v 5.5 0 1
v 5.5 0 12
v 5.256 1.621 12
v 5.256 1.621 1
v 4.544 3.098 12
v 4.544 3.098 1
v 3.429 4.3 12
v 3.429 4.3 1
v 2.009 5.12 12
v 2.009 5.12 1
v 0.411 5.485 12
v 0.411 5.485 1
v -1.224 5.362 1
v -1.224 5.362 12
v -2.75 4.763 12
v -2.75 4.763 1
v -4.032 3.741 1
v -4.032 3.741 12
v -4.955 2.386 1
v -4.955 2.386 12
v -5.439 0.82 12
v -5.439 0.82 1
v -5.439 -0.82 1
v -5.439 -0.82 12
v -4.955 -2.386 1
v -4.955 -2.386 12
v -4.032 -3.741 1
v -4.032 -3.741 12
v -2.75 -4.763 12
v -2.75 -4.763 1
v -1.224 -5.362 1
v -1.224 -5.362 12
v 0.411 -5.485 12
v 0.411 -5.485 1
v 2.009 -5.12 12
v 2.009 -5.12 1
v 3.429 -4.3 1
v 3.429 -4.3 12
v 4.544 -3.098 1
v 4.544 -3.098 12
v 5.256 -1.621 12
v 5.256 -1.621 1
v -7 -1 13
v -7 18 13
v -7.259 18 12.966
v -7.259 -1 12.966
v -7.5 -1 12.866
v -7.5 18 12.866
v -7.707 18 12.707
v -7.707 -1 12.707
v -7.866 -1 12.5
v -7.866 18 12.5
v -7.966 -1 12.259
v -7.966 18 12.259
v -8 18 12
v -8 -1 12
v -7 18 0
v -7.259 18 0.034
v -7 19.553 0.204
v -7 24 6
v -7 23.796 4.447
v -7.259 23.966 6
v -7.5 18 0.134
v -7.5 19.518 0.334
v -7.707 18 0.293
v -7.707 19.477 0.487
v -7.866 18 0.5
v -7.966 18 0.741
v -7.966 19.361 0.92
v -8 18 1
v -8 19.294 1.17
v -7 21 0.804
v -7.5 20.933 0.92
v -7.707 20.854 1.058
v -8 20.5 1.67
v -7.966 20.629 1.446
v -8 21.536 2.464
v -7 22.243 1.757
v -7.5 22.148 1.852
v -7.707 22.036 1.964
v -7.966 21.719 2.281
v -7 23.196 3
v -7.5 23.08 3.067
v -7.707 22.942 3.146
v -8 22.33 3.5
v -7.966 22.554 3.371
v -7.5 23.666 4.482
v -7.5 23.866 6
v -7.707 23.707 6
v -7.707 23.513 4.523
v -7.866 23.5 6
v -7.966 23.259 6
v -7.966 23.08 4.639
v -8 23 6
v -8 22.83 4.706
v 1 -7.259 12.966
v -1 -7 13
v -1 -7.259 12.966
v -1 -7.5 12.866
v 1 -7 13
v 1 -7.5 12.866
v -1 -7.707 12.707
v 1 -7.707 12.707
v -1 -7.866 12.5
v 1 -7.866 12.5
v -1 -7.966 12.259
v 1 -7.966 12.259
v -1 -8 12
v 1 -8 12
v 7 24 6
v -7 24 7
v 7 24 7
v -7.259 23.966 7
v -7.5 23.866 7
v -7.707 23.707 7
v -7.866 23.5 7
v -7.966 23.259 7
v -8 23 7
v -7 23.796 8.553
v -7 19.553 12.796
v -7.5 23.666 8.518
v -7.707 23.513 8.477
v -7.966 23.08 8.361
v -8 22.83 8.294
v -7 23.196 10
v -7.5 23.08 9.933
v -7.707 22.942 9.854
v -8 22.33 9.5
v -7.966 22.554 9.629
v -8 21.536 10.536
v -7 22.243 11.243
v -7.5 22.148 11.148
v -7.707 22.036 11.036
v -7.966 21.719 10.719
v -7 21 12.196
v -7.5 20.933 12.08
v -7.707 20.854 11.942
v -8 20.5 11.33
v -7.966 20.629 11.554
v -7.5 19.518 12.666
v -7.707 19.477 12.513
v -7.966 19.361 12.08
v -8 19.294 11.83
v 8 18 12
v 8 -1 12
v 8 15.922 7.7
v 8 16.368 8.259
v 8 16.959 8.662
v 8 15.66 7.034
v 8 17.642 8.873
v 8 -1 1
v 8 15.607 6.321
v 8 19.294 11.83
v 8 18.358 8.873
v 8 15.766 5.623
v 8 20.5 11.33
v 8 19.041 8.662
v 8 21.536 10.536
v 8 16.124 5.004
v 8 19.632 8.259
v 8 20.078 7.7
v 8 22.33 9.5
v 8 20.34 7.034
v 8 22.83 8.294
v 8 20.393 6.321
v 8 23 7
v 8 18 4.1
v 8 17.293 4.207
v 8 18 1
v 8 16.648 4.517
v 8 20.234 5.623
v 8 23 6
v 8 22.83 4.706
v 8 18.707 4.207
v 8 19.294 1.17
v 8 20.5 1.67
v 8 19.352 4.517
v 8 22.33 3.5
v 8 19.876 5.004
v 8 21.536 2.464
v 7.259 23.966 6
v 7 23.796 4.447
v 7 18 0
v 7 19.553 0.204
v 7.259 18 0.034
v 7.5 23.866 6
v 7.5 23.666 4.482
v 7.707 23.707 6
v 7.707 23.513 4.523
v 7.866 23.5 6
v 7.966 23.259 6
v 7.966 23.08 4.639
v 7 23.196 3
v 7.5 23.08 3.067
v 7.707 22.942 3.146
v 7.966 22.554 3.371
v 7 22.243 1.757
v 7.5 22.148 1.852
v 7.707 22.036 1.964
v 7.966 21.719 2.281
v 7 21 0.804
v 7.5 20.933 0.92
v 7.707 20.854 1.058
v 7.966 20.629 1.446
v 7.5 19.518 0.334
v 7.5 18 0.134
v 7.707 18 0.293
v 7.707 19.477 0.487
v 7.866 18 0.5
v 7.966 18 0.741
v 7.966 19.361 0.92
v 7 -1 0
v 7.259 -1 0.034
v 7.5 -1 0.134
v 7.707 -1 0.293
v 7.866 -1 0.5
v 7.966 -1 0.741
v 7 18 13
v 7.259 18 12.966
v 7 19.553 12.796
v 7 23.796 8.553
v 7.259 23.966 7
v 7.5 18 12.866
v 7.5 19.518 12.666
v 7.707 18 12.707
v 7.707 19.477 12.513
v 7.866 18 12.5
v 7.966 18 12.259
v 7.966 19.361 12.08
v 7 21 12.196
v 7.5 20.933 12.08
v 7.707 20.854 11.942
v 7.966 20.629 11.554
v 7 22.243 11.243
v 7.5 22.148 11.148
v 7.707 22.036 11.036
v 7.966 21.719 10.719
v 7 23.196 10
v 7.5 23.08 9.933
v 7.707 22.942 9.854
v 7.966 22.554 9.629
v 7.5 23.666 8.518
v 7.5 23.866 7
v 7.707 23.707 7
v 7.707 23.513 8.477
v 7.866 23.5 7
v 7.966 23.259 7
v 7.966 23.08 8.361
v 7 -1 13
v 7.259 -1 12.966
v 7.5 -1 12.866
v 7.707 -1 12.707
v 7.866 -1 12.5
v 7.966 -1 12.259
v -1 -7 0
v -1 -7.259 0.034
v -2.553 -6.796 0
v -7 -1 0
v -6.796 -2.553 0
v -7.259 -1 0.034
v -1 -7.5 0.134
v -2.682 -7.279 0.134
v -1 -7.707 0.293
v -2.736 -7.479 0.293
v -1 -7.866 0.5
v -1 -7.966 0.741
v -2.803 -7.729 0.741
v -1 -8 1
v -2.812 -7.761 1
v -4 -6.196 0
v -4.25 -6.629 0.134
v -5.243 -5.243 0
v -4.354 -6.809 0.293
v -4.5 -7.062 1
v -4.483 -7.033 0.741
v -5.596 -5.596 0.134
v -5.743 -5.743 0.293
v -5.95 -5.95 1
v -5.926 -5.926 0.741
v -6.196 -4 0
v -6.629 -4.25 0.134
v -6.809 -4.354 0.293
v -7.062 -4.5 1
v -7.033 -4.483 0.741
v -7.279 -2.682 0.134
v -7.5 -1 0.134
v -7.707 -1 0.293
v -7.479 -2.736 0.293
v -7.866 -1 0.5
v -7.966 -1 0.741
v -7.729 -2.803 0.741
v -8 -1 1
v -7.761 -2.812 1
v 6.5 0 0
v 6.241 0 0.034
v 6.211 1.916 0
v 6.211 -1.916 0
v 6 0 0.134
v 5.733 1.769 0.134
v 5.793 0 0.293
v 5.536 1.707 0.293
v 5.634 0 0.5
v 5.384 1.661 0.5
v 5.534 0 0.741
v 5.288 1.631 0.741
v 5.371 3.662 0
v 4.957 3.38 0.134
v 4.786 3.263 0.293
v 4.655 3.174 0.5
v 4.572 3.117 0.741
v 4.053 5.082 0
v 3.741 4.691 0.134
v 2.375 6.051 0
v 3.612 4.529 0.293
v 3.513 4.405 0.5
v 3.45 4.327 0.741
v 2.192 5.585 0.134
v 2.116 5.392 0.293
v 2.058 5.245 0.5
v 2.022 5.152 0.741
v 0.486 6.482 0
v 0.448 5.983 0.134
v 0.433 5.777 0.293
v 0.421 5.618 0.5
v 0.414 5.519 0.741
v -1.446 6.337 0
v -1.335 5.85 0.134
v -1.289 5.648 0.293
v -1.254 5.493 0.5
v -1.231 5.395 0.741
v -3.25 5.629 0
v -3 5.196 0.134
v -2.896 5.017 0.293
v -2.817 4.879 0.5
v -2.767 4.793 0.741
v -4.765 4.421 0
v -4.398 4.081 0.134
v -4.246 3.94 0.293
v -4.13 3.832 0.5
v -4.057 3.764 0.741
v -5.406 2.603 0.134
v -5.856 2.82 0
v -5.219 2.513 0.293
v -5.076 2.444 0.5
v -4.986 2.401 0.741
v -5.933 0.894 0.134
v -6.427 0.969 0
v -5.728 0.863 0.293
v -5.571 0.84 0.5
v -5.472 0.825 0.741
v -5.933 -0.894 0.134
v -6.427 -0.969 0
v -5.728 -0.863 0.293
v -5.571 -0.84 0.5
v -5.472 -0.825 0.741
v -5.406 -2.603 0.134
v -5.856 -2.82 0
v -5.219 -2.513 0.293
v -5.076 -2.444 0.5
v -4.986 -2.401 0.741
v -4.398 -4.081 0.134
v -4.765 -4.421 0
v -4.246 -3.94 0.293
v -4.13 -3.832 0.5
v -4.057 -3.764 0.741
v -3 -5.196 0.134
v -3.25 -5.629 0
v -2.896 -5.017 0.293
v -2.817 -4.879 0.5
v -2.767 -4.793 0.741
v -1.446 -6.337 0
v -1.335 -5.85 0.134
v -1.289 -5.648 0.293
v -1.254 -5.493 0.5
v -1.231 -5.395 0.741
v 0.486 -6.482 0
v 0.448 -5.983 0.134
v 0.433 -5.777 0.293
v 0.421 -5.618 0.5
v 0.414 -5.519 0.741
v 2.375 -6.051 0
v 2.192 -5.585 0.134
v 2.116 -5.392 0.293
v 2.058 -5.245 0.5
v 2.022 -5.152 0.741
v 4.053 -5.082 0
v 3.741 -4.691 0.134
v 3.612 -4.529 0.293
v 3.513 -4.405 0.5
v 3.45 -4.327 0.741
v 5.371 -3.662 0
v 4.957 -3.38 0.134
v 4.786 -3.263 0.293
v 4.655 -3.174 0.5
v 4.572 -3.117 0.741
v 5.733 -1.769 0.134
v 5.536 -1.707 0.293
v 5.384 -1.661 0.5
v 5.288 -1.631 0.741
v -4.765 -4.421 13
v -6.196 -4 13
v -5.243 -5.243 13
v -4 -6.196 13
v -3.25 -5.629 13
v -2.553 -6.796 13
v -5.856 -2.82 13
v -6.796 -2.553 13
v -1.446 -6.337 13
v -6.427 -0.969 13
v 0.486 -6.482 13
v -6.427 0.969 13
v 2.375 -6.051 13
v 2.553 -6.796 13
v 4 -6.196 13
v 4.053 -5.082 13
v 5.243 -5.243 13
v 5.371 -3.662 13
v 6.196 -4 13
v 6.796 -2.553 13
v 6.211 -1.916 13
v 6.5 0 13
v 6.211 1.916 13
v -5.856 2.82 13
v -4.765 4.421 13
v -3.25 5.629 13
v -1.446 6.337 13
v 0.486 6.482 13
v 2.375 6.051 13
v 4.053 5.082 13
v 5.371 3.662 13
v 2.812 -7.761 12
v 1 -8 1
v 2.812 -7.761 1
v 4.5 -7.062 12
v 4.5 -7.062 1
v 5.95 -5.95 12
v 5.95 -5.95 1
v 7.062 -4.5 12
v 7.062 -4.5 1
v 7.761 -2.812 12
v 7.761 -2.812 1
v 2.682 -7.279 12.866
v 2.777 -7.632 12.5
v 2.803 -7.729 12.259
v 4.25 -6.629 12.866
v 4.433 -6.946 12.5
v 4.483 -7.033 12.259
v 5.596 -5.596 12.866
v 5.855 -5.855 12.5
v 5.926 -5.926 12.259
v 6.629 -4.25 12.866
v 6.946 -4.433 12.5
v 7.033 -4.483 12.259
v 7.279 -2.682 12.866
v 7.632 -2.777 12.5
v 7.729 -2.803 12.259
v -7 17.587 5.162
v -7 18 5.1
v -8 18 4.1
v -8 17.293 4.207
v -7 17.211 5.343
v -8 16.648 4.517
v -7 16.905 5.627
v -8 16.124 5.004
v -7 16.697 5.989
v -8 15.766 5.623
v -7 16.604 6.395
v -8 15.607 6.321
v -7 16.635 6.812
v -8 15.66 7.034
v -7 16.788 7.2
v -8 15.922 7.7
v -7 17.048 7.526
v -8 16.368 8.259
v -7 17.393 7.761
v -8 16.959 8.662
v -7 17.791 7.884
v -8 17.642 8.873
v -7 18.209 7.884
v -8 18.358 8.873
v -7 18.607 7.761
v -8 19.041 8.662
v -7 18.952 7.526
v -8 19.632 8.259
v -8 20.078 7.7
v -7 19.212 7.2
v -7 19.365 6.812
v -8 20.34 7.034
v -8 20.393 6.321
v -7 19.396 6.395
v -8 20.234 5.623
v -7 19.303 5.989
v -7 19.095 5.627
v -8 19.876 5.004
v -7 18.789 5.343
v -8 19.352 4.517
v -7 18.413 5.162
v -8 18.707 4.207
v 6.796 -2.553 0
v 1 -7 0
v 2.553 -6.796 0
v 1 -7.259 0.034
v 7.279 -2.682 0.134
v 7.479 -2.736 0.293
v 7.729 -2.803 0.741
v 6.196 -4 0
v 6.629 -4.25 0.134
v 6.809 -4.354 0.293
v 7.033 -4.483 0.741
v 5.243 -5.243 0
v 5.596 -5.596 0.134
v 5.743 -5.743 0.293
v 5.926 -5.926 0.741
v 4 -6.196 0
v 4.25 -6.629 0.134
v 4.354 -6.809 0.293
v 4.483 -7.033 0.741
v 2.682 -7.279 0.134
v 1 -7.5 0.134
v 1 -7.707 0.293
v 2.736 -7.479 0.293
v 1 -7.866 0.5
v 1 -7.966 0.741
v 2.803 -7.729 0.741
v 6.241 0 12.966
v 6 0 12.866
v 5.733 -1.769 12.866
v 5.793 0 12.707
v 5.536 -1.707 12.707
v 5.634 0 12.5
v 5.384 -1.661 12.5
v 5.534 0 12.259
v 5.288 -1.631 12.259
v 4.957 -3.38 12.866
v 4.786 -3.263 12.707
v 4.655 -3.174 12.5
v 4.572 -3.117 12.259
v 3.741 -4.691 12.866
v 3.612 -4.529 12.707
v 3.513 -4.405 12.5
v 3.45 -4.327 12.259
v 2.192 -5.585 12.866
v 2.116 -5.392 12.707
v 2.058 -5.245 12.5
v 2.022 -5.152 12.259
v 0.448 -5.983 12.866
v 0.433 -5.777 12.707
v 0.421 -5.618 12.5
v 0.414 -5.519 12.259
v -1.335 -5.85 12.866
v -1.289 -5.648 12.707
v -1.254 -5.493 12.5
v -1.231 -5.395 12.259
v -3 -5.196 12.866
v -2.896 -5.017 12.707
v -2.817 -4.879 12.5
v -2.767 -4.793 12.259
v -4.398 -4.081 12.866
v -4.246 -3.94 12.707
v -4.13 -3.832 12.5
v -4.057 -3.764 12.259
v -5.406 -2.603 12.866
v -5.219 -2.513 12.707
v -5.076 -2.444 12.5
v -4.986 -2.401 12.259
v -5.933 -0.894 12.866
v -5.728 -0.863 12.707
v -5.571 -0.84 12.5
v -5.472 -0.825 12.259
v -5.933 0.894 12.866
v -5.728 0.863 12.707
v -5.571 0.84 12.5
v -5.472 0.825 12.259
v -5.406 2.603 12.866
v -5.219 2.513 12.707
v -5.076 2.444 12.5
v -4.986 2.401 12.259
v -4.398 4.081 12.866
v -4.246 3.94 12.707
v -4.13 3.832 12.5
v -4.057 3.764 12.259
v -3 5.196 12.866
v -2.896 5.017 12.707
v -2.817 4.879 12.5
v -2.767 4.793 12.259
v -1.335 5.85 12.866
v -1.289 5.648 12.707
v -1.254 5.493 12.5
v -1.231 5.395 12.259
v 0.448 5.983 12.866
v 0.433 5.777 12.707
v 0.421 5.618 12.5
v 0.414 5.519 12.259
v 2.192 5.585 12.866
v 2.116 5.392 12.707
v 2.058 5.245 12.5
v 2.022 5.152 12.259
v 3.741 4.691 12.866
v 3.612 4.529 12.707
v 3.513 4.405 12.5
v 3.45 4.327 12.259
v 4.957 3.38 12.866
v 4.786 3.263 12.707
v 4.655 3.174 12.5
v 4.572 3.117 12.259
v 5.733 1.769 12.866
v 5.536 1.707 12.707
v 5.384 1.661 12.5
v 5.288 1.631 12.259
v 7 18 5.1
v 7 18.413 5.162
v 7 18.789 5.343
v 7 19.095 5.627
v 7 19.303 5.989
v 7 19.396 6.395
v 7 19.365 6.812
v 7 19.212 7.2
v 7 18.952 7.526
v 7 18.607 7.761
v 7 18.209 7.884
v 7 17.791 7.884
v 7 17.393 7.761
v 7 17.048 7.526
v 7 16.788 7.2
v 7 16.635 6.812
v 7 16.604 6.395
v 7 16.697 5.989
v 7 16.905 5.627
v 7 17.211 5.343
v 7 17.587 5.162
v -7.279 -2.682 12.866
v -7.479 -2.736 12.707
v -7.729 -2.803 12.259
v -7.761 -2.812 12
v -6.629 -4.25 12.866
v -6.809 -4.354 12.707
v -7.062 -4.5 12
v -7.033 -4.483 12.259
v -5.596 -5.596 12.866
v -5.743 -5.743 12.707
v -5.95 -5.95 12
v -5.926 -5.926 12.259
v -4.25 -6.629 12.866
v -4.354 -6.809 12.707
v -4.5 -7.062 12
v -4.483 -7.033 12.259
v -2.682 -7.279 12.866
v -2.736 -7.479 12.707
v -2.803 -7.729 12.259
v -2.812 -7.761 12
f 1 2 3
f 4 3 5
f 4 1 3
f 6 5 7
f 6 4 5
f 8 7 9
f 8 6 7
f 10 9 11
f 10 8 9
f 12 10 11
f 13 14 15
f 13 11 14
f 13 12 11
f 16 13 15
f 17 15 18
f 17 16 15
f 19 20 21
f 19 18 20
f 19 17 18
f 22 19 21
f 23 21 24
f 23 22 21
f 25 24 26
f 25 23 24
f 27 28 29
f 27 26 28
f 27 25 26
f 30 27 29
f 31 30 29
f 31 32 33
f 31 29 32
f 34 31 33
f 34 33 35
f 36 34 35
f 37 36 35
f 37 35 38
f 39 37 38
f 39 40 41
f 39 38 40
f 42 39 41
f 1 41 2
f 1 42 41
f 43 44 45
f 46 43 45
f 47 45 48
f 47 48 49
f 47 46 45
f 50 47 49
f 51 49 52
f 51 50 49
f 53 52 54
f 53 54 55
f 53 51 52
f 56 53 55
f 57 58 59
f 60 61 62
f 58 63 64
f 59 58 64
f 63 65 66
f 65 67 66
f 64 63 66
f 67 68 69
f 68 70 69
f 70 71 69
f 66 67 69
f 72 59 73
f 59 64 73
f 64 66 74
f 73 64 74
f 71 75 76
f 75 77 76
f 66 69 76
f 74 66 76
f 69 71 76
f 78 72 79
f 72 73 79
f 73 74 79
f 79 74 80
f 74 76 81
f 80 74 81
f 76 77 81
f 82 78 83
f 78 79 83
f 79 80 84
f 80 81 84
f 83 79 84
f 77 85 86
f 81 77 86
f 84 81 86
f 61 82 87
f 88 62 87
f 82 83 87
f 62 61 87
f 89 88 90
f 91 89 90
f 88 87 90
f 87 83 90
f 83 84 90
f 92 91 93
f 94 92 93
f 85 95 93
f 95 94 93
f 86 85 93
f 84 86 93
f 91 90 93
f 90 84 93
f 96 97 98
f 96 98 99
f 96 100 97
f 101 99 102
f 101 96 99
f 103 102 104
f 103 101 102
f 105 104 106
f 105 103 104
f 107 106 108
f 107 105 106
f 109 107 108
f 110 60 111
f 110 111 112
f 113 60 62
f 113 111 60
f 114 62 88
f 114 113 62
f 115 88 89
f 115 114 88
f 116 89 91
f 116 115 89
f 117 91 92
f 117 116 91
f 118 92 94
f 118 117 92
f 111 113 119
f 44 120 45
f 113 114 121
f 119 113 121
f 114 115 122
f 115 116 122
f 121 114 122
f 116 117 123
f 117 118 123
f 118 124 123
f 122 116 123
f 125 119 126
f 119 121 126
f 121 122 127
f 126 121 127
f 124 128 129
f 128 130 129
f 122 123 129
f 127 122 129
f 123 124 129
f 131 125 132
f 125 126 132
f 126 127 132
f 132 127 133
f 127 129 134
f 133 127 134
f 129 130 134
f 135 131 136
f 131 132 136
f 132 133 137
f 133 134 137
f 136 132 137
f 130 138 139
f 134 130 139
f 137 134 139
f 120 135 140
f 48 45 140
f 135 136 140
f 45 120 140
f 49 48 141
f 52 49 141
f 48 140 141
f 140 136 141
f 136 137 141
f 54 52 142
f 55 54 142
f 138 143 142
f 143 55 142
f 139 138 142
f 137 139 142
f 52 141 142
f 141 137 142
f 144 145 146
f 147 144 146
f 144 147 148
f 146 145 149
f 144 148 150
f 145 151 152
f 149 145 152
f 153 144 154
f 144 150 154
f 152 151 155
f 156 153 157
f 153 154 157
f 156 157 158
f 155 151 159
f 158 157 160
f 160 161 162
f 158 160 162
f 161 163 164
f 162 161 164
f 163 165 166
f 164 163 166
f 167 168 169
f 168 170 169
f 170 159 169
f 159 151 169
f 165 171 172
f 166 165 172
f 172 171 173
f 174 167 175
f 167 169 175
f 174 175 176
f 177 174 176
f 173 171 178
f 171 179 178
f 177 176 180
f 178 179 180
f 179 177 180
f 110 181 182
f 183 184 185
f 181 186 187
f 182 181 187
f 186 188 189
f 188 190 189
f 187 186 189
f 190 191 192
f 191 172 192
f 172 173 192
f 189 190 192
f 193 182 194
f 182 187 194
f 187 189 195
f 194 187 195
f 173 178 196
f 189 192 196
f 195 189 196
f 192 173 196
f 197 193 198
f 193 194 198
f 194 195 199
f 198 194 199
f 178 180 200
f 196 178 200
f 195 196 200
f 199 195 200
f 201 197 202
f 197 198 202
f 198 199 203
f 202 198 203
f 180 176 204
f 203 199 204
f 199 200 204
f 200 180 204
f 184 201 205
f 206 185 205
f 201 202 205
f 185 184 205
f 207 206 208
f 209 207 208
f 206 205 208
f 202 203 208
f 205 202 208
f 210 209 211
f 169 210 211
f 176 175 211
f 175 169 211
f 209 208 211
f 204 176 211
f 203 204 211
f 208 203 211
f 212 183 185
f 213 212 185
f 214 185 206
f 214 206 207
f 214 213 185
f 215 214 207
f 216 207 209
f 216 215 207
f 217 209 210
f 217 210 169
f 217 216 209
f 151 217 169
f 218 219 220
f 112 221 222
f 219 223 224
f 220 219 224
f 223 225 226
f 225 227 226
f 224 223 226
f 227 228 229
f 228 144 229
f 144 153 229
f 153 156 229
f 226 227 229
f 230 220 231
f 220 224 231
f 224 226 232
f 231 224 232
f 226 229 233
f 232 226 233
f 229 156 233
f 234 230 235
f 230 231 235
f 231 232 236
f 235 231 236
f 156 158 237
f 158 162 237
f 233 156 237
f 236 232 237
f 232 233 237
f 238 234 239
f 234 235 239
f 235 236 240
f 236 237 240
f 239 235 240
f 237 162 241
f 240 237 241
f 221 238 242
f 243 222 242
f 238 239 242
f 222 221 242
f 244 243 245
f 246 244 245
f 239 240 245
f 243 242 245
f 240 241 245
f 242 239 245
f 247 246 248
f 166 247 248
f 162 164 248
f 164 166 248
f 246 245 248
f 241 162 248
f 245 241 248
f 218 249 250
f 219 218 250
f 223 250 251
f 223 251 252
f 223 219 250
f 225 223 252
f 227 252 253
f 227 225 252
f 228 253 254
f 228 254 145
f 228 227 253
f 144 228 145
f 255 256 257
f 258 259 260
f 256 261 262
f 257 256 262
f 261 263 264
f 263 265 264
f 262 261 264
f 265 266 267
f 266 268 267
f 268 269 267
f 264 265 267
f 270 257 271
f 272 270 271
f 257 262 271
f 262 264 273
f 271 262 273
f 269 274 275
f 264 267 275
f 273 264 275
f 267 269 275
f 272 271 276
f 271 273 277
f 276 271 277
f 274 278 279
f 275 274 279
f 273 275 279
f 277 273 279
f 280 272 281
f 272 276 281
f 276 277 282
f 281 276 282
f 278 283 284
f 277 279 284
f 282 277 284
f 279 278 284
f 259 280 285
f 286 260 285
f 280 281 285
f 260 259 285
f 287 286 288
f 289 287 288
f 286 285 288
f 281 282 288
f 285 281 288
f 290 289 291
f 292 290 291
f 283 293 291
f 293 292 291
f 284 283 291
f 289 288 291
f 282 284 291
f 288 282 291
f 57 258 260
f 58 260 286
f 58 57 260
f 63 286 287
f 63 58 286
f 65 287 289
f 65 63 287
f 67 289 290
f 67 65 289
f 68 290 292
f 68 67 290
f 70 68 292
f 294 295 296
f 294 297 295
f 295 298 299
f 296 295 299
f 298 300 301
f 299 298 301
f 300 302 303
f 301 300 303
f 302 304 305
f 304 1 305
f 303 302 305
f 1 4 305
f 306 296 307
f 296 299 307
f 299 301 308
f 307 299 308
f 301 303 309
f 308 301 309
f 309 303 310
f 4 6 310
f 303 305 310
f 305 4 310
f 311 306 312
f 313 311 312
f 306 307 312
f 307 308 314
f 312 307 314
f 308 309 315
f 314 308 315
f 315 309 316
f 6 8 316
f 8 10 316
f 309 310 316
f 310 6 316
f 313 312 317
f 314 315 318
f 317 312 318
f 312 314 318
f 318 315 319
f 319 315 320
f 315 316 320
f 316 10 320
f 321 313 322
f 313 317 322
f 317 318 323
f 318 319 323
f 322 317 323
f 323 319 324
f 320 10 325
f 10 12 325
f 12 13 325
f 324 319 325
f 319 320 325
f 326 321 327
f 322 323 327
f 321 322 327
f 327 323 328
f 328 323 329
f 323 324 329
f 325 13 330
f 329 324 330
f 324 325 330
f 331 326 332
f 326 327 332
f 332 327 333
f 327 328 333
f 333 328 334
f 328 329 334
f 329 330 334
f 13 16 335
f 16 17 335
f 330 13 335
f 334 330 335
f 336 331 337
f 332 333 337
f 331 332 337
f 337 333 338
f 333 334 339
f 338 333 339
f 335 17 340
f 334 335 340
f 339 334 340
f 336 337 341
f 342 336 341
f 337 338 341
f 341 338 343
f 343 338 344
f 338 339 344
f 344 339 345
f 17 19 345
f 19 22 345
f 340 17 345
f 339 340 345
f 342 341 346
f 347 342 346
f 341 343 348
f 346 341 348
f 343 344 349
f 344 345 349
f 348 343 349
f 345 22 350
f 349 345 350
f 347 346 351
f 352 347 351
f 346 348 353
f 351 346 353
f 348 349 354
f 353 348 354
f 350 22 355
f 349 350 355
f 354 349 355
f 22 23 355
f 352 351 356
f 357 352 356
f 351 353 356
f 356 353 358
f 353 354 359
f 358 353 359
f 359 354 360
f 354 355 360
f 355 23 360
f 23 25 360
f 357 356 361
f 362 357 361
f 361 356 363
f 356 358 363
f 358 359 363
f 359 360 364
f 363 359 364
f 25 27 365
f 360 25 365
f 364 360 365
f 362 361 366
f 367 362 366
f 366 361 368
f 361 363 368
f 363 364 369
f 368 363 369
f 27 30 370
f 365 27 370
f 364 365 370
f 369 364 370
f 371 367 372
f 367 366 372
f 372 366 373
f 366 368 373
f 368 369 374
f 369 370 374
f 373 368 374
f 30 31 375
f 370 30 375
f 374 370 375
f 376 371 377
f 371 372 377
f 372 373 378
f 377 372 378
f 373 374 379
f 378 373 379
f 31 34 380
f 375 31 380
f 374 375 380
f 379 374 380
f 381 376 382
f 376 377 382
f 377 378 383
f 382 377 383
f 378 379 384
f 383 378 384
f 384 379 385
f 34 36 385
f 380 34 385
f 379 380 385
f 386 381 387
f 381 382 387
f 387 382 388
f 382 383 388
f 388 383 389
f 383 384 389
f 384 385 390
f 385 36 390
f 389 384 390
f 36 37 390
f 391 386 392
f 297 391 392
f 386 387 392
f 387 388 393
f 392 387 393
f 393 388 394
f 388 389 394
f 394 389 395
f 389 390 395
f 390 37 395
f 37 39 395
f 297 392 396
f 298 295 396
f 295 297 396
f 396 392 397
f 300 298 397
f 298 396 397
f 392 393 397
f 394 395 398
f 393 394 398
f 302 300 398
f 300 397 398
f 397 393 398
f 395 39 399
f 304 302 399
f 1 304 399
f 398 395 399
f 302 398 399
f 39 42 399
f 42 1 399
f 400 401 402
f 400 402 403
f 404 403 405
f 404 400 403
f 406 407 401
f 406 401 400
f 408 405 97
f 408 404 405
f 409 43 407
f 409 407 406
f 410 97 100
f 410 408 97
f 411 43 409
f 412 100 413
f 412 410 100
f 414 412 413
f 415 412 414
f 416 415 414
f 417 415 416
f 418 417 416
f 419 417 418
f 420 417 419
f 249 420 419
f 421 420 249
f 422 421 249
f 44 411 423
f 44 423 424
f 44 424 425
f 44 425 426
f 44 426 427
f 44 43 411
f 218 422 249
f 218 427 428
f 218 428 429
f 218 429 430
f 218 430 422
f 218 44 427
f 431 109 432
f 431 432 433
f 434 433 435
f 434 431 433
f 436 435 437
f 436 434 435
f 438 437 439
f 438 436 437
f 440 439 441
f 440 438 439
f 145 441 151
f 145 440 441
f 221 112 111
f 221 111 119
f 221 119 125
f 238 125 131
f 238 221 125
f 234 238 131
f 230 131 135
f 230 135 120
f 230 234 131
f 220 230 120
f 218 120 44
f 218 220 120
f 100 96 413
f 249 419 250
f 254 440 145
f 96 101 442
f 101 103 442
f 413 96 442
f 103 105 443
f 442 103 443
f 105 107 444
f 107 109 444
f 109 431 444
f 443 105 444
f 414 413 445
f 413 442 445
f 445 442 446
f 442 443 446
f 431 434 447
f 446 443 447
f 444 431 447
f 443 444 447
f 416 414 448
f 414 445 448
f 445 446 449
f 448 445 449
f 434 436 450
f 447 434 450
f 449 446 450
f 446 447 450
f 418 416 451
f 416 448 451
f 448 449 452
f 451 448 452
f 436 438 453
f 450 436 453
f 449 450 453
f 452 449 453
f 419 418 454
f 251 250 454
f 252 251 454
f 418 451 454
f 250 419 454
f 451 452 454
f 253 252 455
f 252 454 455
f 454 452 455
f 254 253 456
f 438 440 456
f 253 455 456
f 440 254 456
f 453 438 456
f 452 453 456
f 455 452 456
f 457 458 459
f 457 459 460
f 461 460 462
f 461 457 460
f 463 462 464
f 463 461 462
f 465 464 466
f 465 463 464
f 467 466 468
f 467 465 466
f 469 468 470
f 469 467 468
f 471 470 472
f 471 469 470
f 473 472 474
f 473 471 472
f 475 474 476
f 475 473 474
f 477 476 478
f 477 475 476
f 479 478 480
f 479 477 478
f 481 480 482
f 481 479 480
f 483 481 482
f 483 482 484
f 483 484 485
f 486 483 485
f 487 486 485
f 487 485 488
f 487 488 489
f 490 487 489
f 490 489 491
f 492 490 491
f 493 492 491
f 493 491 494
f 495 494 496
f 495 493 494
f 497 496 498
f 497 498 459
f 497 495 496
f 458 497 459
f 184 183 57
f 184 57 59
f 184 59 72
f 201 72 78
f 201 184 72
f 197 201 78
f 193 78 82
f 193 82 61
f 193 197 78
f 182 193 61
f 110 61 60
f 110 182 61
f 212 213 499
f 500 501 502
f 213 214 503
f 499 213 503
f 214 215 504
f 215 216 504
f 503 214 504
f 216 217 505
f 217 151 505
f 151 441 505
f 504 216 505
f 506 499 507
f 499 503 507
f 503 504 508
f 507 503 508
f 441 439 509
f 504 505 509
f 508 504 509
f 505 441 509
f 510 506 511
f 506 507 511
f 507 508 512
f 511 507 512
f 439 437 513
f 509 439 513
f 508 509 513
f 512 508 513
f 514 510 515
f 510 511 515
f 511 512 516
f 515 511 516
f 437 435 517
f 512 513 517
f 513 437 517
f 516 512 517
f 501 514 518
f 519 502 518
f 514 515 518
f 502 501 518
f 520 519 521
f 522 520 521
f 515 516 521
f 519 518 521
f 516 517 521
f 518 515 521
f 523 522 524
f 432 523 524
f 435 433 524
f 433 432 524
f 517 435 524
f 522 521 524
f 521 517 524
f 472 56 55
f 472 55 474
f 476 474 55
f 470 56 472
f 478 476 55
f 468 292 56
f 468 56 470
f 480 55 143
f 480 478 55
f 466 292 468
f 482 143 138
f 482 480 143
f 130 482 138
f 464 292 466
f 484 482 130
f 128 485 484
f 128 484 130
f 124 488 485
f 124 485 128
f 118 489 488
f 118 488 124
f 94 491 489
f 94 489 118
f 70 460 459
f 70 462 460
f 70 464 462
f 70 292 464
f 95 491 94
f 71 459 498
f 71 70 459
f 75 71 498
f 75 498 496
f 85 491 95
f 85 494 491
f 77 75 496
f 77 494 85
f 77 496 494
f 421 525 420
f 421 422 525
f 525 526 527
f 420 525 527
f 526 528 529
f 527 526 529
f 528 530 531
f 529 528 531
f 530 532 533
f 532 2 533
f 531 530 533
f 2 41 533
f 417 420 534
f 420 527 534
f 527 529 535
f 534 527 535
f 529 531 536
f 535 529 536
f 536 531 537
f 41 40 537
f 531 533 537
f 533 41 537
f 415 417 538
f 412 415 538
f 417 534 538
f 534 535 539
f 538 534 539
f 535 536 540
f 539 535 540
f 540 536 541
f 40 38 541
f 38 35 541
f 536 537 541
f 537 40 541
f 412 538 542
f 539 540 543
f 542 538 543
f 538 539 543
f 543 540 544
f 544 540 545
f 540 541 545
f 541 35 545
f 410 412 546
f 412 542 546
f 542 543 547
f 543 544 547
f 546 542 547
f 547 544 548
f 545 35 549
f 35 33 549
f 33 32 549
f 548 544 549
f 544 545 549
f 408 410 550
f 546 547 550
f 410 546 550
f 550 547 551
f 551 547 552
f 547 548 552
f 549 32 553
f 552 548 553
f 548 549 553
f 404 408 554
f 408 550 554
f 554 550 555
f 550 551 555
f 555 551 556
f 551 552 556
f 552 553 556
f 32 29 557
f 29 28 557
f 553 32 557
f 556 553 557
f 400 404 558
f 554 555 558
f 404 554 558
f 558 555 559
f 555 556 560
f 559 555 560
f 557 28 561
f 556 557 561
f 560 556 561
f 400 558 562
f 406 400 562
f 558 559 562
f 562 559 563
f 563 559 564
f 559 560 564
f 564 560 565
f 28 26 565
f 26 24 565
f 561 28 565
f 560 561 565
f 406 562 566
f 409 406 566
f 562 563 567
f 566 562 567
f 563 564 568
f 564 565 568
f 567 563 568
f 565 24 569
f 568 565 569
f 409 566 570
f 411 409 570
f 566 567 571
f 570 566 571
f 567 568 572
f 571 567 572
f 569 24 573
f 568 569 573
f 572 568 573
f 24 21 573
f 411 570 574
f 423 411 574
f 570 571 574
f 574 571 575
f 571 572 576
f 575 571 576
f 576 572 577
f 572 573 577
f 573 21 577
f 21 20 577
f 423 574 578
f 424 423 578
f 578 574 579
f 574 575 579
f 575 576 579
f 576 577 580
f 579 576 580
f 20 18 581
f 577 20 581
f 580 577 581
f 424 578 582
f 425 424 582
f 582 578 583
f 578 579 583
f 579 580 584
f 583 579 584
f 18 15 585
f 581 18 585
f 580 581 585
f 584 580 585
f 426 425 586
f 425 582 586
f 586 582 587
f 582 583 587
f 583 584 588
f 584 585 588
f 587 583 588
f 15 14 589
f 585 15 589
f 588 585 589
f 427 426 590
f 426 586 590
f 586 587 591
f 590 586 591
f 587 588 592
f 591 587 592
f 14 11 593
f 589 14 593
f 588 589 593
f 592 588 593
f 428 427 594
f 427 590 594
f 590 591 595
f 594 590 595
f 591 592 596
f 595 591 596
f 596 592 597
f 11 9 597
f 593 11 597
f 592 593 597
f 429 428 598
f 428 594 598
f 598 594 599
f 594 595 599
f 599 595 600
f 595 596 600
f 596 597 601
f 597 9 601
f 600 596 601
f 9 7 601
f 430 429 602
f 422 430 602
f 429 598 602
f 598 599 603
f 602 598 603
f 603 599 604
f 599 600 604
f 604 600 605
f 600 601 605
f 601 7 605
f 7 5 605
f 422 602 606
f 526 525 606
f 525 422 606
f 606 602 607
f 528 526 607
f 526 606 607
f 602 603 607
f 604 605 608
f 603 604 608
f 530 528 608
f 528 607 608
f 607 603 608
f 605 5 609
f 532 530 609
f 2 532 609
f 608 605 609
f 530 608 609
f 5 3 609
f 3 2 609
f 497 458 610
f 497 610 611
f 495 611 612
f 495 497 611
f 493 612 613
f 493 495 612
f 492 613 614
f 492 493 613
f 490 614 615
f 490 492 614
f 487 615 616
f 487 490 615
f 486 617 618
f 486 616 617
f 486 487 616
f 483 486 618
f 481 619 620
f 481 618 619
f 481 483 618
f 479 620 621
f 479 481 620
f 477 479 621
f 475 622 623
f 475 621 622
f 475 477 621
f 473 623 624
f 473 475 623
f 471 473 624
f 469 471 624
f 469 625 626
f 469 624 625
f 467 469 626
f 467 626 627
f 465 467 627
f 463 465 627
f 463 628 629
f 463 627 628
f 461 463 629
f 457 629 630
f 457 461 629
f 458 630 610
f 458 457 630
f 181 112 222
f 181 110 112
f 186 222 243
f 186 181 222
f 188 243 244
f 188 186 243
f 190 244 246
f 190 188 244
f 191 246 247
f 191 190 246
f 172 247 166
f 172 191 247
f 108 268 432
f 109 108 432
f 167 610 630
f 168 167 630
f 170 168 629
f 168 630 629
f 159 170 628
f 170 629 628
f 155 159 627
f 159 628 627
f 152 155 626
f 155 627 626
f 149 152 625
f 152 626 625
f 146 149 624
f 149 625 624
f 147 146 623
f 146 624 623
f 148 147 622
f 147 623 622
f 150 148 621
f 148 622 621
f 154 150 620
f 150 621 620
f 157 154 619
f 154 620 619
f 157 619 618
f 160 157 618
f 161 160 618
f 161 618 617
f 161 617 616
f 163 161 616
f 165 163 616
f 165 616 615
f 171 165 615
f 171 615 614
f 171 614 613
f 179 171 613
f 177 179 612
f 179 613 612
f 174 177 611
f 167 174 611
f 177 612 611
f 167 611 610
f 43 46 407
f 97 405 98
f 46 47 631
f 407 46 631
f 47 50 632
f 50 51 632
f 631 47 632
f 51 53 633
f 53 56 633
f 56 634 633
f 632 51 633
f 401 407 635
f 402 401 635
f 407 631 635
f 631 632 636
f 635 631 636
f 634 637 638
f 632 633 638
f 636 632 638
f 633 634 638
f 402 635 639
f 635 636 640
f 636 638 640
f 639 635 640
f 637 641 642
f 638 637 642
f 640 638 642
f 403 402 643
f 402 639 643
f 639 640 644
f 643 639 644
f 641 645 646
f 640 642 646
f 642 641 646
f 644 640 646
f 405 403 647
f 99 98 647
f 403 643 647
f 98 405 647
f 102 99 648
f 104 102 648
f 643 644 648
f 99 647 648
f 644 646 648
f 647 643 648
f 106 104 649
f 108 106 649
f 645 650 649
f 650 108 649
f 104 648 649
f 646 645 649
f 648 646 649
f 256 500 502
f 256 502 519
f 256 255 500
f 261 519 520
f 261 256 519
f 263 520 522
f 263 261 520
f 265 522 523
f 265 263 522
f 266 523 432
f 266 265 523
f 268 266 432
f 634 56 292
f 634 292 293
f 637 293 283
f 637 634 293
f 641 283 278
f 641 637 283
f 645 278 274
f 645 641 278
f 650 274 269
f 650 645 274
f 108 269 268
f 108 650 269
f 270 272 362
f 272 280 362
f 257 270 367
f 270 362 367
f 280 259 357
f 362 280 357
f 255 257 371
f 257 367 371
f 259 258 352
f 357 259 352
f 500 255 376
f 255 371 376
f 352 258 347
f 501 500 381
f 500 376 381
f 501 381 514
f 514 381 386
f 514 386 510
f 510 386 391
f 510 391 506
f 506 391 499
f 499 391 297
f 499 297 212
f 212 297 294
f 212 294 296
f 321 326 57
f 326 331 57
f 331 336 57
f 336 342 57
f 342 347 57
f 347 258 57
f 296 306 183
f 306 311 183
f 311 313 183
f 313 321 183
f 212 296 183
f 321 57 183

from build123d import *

# Parameters (mm, degrees)
CYLINDER008_R     = 5.5
CYLINDER008_DEPTH = 20
CYLINDER009_R     = 1.4
CYLINDER009_DEPTH = 20
BOX002_W          = 16
BOX002_H          = 32
BOX002_DEPTH      = 13
FILLET008_R       = 7
FILLET009_R       = 6
FILLET010_R       = 1
FILLET011_R       = 1
CHAMFER007_SIZE   = 1


with BuildPart() as cylinder:
    # Cylinder008 → Cylinder008 (new body)
    with BuildSketch(Plane.XY):
        Circle(CYLINDER008_R)
    extrude(amount=CYLINDER008_DEPTH)


with BuildPart() as fusion004:
    # Cylinder009 → Cylinder009 (new body)
    with BuildSketch(Plane(origin=(-10, 18, 6.5), x_dir=(0, 0, -1), z_dir=(1, 0, 0))):
        Circle(CYLINDER009_R)
    extrude(amount=CYLINDER009_DEPTH)

    # Fusion004: union Cylinder
    add(cylinder.part)


with BuildPart() as hindge003:
    # Box002 → Box002 (new body)
    with BuildSketch(Plane(origin=(-8, -8, 0), x_dir=(1, 0, 0), z_dir=(0, 0, 1))):
        with Locations((8, 16)):
            Rectangle(BOX002_W, BOX002_H)
    extrude(amount=BOX002_DEPTH)

    # Fillet008
    fillet008_edges = [hindge003.edges().sort_by_distance(p)[0] for p in [
        (-8, -8, 6.5),
        (8, -8, 6.5),
    ]]
    fillet(fillet008_edges, radius=FILLET008_R)

    # Fillet009
    fillet009_edges = [hindge003.edges().sort_by_distance(p)[0] for p in [
        (0, 24, 13),
        (0, 24, 0),
    ]]
    fillet(fillet009_edges, radius=FILLET009_R)

    # Fillet010
    fillet010_edges = [hindge003.edges().sort_by_distance(p)[0] for p in [
        (8, 8.5, 13),
    ]]
    fillet(fillet010_edges, radius=FILLET010_R)

    # Cut004: cut Fusion004
    add(fusion004.part, mode=Mode.SUBTRACT)

    # Fillet011
    fillet011_edges = [hindge003.edges().sort_by_distance(p)[0] for p in [
        (-5.5, 0, 0),
        (-5.5, 0, 13),
    ]]
    fillet(fillet011_edges, radius=FILLET011_R)

    # Chamfer007
    chamfer007_edges = [hindge003.edges().sort_by_distance(p)[0] for p in [
        (-8, 18, 7.9),
        (8, 18, 7.9),
    ]]
    chamfer(chamfer007_edges, length=CHAMFER007_SIZE)


solid = hindge003.part
